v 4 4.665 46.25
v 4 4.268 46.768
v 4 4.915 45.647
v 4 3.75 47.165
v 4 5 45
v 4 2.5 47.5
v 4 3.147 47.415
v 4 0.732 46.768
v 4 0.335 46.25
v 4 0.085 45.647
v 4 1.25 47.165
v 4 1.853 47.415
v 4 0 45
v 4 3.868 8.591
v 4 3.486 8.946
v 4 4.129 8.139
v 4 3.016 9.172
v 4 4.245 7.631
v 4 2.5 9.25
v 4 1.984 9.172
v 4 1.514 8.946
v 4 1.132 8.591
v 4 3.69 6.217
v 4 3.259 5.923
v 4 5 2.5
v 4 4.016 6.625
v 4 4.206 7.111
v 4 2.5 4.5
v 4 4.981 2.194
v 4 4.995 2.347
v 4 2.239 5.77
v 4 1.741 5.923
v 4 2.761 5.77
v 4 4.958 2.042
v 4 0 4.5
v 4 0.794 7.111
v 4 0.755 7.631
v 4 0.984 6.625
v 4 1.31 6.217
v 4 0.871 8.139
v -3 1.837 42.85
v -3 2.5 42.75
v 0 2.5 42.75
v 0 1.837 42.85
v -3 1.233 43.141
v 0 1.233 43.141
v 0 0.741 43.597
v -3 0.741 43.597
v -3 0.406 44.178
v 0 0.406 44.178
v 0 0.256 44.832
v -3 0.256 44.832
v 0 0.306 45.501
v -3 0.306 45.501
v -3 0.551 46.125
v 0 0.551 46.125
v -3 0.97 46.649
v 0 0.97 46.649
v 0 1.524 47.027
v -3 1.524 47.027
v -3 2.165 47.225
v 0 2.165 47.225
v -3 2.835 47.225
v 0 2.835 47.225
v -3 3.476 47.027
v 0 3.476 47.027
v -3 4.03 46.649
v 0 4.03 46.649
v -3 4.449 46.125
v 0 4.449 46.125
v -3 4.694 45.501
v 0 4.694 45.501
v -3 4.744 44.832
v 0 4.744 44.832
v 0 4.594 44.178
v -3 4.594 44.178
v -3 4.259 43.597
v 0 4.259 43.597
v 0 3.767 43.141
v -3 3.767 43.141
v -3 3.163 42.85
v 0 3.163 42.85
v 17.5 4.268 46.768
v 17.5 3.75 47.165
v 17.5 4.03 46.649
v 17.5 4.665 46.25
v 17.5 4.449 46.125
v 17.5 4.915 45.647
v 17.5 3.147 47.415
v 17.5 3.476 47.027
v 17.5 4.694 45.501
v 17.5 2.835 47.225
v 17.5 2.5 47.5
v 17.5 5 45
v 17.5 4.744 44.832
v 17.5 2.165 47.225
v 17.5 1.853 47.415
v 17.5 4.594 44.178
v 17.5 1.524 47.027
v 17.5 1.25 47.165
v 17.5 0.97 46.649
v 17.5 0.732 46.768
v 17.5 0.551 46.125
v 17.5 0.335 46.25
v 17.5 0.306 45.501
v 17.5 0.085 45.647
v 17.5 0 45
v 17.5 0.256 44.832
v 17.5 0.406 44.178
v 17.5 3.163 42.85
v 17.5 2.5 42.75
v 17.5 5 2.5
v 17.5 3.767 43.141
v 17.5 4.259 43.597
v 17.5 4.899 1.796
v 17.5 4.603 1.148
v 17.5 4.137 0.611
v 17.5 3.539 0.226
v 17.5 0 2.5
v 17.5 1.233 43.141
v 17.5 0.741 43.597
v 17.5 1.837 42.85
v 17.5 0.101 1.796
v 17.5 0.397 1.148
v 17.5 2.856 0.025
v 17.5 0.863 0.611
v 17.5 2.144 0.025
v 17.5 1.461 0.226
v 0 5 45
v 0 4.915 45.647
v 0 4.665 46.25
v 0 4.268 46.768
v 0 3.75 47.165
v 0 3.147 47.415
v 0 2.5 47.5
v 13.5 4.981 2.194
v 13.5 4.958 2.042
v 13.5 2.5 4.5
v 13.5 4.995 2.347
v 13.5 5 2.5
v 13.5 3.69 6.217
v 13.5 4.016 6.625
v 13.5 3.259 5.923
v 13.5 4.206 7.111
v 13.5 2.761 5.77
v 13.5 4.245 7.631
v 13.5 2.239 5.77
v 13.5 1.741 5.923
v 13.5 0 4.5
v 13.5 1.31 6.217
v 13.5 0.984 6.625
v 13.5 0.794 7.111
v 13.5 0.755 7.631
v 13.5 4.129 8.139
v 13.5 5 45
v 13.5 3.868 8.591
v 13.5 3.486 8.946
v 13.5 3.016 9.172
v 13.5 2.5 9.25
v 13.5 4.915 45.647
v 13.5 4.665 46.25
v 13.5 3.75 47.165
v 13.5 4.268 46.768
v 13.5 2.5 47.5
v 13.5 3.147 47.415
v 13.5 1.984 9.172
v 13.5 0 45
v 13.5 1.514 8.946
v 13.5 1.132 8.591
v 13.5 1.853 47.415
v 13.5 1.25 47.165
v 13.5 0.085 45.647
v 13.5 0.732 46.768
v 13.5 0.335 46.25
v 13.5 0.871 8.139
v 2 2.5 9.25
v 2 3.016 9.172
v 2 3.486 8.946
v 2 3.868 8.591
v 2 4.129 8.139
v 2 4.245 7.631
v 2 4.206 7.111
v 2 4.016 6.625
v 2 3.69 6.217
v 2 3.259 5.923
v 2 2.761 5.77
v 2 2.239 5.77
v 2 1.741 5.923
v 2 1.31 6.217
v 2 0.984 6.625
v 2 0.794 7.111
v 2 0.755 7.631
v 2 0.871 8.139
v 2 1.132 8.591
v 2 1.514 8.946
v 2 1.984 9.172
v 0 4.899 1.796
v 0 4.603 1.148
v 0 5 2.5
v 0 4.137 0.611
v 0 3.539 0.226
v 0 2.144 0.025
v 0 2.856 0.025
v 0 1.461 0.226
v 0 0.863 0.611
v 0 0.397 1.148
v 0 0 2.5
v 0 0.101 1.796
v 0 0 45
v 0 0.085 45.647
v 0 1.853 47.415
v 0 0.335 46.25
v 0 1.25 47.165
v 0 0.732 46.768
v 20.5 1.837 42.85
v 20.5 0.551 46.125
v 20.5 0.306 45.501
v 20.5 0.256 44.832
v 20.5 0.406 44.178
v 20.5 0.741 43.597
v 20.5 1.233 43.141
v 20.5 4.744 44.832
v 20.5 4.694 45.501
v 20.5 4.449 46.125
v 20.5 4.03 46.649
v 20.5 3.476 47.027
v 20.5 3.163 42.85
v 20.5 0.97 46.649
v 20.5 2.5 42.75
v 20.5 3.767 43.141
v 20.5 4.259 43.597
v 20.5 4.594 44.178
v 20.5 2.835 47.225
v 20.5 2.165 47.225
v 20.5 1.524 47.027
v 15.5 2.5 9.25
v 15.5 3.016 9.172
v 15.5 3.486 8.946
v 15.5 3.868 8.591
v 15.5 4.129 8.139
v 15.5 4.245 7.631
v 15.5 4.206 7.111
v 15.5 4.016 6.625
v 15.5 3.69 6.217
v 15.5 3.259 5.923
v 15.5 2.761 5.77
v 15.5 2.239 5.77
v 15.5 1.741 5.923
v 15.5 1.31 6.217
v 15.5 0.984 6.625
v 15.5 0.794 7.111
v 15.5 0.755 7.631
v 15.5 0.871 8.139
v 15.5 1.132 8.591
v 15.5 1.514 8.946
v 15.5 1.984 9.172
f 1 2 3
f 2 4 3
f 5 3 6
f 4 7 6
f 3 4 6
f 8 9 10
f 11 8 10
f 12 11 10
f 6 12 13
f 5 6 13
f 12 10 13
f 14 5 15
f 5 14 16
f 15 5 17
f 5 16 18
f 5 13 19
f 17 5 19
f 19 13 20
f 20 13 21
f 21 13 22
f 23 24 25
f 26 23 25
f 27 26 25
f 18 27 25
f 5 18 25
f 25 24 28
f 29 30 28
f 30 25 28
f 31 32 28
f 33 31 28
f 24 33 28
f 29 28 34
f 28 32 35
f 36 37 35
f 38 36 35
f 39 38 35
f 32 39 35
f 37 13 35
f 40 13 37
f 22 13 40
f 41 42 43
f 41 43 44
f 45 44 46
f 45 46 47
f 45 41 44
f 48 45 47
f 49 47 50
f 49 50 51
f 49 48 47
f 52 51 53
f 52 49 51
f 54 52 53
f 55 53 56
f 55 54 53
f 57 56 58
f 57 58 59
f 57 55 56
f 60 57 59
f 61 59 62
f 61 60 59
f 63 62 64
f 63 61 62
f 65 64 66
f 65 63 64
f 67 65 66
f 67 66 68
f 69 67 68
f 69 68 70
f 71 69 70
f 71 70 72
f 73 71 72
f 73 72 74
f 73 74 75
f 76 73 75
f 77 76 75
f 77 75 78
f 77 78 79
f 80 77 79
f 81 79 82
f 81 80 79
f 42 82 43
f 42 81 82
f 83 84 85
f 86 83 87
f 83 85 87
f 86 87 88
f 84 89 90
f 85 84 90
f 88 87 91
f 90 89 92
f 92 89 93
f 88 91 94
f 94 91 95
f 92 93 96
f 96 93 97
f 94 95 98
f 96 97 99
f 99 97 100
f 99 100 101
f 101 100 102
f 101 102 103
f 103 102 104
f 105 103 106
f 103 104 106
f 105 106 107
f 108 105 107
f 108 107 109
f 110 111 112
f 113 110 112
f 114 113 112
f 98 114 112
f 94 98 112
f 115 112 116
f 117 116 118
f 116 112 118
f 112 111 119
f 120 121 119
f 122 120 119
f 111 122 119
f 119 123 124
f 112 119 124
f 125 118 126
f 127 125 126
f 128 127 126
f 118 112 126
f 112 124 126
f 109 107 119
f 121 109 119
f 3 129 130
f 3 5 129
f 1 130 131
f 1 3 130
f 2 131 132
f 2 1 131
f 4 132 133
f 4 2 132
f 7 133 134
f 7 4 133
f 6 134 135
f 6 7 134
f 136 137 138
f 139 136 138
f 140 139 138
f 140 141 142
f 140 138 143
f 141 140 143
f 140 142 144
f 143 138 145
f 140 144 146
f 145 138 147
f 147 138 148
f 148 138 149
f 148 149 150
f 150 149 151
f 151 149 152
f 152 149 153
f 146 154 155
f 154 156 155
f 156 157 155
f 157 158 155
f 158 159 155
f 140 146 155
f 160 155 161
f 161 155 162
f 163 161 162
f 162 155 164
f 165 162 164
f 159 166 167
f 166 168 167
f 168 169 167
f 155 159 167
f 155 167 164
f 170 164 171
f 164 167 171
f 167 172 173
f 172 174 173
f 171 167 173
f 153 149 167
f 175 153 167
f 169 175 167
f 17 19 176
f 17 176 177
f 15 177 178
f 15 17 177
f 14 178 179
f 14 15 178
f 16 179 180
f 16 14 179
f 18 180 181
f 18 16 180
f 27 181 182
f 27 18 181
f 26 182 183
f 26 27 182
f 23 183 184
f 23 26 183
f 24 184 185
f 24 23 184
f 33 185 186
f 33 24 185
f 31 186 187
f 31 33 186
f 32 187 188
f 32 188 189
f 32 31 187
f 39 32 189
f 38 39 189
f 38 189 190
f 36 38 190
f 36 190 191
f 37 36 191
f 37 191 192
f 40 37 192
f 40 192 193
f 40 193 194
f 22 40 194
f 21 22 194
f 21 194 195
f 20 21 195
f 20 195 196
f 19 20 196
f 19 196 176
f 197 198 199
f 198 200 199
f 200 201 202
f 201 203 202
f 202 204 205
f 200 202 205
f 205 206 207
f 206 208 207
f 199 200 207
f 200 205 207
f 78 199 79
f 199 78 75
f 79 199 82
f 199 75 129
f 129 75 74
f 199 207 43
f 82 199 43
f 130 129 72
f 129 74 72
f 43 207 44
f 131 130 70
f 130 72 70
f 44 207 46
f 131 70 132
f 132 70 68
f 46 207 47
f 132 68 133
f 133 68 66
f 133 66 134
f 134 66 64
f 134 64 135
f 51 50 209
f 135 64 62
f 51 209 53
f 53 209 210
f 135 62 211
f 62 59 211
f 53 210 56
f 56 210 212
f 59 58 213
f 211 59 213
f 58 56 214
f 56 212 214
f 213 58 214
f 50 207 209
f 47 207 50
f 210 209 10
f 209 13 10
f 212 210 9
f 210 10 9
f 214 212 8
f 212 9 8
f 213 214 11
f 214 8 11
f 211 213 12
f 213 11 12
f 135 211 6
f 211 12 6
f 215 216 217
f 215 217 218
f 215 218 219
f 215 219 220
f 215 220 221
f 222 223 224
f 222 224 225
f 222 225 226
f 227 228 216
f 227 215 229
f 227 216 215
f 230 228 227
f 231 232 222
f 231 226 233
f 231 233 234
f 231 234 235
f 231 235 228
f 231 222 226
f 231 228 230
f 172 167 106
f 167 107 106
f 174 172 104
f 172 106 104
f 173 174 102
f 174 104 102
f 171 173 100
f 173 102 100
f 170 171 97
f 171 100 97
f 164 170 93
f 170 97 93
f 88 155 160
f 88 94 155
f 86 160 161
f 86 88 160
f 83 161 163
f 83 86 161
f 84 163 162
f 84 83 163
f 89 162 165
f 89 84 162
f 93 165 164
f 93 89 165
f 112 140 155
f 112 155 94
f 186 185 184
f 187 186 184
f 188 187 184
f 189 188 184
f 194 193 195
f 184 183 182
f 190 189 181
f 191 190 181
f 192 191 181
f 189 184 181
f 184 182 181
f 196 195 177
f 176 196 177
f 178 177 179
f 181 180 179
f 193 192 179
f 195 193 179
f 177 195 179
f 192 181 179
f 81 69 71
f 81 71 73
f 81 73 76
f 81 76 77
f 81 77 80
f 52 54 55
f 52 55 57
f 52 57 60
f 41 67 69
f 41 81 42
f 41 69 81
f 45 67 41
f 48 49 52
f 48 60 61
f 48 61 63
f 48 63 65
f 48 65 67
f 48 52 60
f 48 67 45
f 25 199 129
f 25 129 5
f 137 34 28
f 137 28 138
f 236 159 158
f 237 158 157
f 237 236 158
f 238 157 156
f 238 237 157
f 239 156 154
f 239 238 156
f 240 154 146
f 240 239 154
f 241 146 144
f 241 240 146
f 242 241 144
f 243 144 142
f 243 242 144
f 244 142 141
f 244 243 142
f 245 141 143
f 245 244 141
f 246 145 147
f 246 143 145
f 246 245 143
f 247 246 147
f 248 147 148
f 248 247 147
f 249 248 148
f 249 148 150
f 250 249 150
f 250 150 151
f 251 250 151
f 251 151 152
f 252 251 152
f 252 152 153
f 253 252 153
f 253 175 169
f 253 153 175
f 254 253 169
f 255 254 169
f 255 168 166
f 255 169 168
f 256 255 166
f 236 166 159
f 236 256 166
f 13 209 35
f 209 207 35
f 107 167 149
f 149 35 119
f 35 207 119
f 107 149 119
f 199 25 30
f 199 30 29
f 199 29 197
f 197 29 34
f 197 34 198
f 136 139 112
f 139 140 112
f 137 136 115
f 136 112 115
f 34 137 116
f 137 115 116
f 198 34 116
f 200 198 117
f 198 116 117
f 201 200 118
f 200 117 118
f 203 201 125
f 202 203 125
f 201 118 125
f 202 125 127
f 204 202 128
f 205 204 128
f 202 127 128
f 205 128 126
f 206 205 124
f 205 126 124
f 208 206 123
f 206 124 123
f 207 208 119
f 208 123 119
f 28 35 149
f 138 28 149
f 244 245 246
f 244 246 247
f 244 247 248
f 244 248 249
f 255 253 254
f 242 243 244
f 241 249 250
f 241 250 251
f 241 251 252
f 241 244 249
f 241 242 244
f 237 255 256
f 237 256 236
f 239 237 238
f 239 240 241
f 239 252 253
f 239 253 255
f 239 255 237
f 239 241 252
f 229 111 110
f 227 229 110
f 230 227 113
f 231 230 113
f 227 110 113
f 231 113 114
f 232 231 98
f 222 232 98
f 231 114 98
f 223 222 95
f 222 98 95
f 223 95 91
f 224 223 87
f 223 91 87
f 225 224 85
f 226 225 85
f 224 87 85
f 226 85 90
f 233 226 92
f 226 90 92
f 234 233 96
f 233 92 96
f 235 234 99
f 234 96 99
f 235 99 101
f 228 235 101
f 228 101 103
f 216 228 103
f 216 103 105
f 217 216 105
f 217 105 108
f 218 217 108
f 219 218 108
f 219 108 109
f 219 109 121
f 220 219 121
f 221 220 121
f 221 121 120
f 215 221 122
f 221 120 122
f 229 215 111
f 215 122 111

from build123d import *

# Parameters (mm, degrees)
BOSS_EXTRUDE1_DEPTH     = 5
SKETCH2_R               = 2.25
BOSS_EXTRUDE2_DEPTH     = 3
FILLET3_R               = 2.5
BOSS_EXTRUDE3_START     = 3
SKETCH3_R               = 2.25
BOSS_EXTRUDE3_DEPTH     = 3
FILLET4_R               = 2.5
CHAMFER1_START          = 4.949747468
CHAMFER1_OUTLINE_W      = 9.5
CHAMFER1_OUTLINE_H      = 3.535533906
CHAMFER1_DEPTH          = 3.050252532
FILLET5_R               = 2.5
CUT_EXTRUDE1_DEPTH      = 11.5
CUT_EXTRUDE1_DEPTH_BACK = 2
SKETCH4_R               = 1.75


with BuildPart() as part:
    # Sketch1 → Boss-Extrude1 (new body)
    with BuildSketch(Plane(origin=(0, 0, 0), x_dir=(1, 0, 0), z_dir=(0, 1, 0))):
        Polygon((17.5, 0), (0, 0), (0, -47.5), (4, -47.5), (4, -4.5), (13.5, -4.5), (13.5, -47.5), (17.5, -47.5), align=None)
    extrude(amount=BOSS_EXTRUDE1_DEPTH)

    # Sketch2 → Boss-Extrude2 (add)
    with BuildSketch(Plane(origin=(17.5, 0, 0), x_dir=(0, 0, -1), z_dir=(1, 0, 0))):
        with Locations((-45, 2.5)):
            Circle(SKETCH2_R)
    extrude(amount=BOSS_EXTRUDE2_DEPTH)

    # Fillet3
    fillet3_edges = [part.edges().sort_by_distance(p)[0] for p in [
        (15.5, 0, 47.5),
        (15.5, 5, 47.5),
    ]]
    fillet(fillet3_edges, radius=FILLET3_R - 0.0001)  # a hair under: the kernel refuses the full size

    # Sketch3 → Boss-Extrude3 (add)
    with BuildSketch(Plane.ZY.offset(BOSS_EXTRUDE3_START)):
        with Locations(Location((45, 2.5, 0), (0, 0, 180))):
            Circle(SKETCH3_R)
    extrude(amount=-BOSS_EXTRUDE3_DEPTH)

    # Fillet4
    fillet4_edges = [part.edges().sort_by_distance(p)[0] for p in [
        (2, 0, 47.5),
        (2, 5, 47.5),
    ]]
    fillet(fillet4_edges, radius=FILLET4_R - 0.0001)  # a hair under: the kernel refuses the full size

    # Chamfer1: read off the stored shape, not the designer's step
    # Chamfer1 outline → Chamfer1 (cut)
    with BuildSketch(Plane(origin=(0, 0, 0), x_dir=(1, 0, 0), z_dir=(0, 0.7071067811865476, 0.7071067811865476)).offset(CHAMFER1_START)):
        with Locations((8.75, 0.353553391)):
            Rectangle(CHAMFER1_OUTLINE_W, CHAMFER1_OUTLINE_H)
    extrude(amount=CHAMFER1_DEPTH, mode=Mode.SUBTRACT)

    # Fillet5
    # the kernel refuses this fillet: 2.5 mm, written as the material it takes off along each edge
    with BuildSketch(Plane(origin=(23.75, 0, 0), x_dir=(0, 0, 1), z_dir=(-1, 0, 0))) as fillet5_piece_1:
        with BuildLine():
            CenterArc((FILLET5_R, FILLET5_R), FILLET5_R, 180, 90)
            Line((0, FILLET5_R), (0, 0))
            Line((0, 0), (FILLET5_R, 0))
        make_face()
    extrude(amount=30, mode=Mode.SUBTRACT)
    with BuildSketch(Plane(origin=(23.75, 5, 0), x_dir=(0, 0, 1), z_dir=(-1, 0, 0))) as fillet5_piece_2:
        with BuildLine():
            CenterArc((FILLET5_R, -FILLET5_R), FILLET5_R, 90, 90)
            Line((0, -FILLET5_R), (0, 0))
            Line((0, 0), (FILLET5_R, 0))
        make_face()
    extrude(amount=30, mode=Mode.SUBTRACT)

    # Sketch4 → Cut-Extrude1 (cut, two sides: drawn at the far end of the back side and taken through both)
    with BuildSketch(Plane.ZY.offset(-13.5).offset(-CUT_EXTRUDE1_DEPTH_BACK)):
        with Locations((7.5, 2.5)):
            Circle(SKETCH4_R)
    extrude(amount=CUT_EXTRUDE1_DEPTH + CUT_EXTRUDE1_DEPTH_BACK, mode=Mode.SUBTRACT)


solid = part.part
